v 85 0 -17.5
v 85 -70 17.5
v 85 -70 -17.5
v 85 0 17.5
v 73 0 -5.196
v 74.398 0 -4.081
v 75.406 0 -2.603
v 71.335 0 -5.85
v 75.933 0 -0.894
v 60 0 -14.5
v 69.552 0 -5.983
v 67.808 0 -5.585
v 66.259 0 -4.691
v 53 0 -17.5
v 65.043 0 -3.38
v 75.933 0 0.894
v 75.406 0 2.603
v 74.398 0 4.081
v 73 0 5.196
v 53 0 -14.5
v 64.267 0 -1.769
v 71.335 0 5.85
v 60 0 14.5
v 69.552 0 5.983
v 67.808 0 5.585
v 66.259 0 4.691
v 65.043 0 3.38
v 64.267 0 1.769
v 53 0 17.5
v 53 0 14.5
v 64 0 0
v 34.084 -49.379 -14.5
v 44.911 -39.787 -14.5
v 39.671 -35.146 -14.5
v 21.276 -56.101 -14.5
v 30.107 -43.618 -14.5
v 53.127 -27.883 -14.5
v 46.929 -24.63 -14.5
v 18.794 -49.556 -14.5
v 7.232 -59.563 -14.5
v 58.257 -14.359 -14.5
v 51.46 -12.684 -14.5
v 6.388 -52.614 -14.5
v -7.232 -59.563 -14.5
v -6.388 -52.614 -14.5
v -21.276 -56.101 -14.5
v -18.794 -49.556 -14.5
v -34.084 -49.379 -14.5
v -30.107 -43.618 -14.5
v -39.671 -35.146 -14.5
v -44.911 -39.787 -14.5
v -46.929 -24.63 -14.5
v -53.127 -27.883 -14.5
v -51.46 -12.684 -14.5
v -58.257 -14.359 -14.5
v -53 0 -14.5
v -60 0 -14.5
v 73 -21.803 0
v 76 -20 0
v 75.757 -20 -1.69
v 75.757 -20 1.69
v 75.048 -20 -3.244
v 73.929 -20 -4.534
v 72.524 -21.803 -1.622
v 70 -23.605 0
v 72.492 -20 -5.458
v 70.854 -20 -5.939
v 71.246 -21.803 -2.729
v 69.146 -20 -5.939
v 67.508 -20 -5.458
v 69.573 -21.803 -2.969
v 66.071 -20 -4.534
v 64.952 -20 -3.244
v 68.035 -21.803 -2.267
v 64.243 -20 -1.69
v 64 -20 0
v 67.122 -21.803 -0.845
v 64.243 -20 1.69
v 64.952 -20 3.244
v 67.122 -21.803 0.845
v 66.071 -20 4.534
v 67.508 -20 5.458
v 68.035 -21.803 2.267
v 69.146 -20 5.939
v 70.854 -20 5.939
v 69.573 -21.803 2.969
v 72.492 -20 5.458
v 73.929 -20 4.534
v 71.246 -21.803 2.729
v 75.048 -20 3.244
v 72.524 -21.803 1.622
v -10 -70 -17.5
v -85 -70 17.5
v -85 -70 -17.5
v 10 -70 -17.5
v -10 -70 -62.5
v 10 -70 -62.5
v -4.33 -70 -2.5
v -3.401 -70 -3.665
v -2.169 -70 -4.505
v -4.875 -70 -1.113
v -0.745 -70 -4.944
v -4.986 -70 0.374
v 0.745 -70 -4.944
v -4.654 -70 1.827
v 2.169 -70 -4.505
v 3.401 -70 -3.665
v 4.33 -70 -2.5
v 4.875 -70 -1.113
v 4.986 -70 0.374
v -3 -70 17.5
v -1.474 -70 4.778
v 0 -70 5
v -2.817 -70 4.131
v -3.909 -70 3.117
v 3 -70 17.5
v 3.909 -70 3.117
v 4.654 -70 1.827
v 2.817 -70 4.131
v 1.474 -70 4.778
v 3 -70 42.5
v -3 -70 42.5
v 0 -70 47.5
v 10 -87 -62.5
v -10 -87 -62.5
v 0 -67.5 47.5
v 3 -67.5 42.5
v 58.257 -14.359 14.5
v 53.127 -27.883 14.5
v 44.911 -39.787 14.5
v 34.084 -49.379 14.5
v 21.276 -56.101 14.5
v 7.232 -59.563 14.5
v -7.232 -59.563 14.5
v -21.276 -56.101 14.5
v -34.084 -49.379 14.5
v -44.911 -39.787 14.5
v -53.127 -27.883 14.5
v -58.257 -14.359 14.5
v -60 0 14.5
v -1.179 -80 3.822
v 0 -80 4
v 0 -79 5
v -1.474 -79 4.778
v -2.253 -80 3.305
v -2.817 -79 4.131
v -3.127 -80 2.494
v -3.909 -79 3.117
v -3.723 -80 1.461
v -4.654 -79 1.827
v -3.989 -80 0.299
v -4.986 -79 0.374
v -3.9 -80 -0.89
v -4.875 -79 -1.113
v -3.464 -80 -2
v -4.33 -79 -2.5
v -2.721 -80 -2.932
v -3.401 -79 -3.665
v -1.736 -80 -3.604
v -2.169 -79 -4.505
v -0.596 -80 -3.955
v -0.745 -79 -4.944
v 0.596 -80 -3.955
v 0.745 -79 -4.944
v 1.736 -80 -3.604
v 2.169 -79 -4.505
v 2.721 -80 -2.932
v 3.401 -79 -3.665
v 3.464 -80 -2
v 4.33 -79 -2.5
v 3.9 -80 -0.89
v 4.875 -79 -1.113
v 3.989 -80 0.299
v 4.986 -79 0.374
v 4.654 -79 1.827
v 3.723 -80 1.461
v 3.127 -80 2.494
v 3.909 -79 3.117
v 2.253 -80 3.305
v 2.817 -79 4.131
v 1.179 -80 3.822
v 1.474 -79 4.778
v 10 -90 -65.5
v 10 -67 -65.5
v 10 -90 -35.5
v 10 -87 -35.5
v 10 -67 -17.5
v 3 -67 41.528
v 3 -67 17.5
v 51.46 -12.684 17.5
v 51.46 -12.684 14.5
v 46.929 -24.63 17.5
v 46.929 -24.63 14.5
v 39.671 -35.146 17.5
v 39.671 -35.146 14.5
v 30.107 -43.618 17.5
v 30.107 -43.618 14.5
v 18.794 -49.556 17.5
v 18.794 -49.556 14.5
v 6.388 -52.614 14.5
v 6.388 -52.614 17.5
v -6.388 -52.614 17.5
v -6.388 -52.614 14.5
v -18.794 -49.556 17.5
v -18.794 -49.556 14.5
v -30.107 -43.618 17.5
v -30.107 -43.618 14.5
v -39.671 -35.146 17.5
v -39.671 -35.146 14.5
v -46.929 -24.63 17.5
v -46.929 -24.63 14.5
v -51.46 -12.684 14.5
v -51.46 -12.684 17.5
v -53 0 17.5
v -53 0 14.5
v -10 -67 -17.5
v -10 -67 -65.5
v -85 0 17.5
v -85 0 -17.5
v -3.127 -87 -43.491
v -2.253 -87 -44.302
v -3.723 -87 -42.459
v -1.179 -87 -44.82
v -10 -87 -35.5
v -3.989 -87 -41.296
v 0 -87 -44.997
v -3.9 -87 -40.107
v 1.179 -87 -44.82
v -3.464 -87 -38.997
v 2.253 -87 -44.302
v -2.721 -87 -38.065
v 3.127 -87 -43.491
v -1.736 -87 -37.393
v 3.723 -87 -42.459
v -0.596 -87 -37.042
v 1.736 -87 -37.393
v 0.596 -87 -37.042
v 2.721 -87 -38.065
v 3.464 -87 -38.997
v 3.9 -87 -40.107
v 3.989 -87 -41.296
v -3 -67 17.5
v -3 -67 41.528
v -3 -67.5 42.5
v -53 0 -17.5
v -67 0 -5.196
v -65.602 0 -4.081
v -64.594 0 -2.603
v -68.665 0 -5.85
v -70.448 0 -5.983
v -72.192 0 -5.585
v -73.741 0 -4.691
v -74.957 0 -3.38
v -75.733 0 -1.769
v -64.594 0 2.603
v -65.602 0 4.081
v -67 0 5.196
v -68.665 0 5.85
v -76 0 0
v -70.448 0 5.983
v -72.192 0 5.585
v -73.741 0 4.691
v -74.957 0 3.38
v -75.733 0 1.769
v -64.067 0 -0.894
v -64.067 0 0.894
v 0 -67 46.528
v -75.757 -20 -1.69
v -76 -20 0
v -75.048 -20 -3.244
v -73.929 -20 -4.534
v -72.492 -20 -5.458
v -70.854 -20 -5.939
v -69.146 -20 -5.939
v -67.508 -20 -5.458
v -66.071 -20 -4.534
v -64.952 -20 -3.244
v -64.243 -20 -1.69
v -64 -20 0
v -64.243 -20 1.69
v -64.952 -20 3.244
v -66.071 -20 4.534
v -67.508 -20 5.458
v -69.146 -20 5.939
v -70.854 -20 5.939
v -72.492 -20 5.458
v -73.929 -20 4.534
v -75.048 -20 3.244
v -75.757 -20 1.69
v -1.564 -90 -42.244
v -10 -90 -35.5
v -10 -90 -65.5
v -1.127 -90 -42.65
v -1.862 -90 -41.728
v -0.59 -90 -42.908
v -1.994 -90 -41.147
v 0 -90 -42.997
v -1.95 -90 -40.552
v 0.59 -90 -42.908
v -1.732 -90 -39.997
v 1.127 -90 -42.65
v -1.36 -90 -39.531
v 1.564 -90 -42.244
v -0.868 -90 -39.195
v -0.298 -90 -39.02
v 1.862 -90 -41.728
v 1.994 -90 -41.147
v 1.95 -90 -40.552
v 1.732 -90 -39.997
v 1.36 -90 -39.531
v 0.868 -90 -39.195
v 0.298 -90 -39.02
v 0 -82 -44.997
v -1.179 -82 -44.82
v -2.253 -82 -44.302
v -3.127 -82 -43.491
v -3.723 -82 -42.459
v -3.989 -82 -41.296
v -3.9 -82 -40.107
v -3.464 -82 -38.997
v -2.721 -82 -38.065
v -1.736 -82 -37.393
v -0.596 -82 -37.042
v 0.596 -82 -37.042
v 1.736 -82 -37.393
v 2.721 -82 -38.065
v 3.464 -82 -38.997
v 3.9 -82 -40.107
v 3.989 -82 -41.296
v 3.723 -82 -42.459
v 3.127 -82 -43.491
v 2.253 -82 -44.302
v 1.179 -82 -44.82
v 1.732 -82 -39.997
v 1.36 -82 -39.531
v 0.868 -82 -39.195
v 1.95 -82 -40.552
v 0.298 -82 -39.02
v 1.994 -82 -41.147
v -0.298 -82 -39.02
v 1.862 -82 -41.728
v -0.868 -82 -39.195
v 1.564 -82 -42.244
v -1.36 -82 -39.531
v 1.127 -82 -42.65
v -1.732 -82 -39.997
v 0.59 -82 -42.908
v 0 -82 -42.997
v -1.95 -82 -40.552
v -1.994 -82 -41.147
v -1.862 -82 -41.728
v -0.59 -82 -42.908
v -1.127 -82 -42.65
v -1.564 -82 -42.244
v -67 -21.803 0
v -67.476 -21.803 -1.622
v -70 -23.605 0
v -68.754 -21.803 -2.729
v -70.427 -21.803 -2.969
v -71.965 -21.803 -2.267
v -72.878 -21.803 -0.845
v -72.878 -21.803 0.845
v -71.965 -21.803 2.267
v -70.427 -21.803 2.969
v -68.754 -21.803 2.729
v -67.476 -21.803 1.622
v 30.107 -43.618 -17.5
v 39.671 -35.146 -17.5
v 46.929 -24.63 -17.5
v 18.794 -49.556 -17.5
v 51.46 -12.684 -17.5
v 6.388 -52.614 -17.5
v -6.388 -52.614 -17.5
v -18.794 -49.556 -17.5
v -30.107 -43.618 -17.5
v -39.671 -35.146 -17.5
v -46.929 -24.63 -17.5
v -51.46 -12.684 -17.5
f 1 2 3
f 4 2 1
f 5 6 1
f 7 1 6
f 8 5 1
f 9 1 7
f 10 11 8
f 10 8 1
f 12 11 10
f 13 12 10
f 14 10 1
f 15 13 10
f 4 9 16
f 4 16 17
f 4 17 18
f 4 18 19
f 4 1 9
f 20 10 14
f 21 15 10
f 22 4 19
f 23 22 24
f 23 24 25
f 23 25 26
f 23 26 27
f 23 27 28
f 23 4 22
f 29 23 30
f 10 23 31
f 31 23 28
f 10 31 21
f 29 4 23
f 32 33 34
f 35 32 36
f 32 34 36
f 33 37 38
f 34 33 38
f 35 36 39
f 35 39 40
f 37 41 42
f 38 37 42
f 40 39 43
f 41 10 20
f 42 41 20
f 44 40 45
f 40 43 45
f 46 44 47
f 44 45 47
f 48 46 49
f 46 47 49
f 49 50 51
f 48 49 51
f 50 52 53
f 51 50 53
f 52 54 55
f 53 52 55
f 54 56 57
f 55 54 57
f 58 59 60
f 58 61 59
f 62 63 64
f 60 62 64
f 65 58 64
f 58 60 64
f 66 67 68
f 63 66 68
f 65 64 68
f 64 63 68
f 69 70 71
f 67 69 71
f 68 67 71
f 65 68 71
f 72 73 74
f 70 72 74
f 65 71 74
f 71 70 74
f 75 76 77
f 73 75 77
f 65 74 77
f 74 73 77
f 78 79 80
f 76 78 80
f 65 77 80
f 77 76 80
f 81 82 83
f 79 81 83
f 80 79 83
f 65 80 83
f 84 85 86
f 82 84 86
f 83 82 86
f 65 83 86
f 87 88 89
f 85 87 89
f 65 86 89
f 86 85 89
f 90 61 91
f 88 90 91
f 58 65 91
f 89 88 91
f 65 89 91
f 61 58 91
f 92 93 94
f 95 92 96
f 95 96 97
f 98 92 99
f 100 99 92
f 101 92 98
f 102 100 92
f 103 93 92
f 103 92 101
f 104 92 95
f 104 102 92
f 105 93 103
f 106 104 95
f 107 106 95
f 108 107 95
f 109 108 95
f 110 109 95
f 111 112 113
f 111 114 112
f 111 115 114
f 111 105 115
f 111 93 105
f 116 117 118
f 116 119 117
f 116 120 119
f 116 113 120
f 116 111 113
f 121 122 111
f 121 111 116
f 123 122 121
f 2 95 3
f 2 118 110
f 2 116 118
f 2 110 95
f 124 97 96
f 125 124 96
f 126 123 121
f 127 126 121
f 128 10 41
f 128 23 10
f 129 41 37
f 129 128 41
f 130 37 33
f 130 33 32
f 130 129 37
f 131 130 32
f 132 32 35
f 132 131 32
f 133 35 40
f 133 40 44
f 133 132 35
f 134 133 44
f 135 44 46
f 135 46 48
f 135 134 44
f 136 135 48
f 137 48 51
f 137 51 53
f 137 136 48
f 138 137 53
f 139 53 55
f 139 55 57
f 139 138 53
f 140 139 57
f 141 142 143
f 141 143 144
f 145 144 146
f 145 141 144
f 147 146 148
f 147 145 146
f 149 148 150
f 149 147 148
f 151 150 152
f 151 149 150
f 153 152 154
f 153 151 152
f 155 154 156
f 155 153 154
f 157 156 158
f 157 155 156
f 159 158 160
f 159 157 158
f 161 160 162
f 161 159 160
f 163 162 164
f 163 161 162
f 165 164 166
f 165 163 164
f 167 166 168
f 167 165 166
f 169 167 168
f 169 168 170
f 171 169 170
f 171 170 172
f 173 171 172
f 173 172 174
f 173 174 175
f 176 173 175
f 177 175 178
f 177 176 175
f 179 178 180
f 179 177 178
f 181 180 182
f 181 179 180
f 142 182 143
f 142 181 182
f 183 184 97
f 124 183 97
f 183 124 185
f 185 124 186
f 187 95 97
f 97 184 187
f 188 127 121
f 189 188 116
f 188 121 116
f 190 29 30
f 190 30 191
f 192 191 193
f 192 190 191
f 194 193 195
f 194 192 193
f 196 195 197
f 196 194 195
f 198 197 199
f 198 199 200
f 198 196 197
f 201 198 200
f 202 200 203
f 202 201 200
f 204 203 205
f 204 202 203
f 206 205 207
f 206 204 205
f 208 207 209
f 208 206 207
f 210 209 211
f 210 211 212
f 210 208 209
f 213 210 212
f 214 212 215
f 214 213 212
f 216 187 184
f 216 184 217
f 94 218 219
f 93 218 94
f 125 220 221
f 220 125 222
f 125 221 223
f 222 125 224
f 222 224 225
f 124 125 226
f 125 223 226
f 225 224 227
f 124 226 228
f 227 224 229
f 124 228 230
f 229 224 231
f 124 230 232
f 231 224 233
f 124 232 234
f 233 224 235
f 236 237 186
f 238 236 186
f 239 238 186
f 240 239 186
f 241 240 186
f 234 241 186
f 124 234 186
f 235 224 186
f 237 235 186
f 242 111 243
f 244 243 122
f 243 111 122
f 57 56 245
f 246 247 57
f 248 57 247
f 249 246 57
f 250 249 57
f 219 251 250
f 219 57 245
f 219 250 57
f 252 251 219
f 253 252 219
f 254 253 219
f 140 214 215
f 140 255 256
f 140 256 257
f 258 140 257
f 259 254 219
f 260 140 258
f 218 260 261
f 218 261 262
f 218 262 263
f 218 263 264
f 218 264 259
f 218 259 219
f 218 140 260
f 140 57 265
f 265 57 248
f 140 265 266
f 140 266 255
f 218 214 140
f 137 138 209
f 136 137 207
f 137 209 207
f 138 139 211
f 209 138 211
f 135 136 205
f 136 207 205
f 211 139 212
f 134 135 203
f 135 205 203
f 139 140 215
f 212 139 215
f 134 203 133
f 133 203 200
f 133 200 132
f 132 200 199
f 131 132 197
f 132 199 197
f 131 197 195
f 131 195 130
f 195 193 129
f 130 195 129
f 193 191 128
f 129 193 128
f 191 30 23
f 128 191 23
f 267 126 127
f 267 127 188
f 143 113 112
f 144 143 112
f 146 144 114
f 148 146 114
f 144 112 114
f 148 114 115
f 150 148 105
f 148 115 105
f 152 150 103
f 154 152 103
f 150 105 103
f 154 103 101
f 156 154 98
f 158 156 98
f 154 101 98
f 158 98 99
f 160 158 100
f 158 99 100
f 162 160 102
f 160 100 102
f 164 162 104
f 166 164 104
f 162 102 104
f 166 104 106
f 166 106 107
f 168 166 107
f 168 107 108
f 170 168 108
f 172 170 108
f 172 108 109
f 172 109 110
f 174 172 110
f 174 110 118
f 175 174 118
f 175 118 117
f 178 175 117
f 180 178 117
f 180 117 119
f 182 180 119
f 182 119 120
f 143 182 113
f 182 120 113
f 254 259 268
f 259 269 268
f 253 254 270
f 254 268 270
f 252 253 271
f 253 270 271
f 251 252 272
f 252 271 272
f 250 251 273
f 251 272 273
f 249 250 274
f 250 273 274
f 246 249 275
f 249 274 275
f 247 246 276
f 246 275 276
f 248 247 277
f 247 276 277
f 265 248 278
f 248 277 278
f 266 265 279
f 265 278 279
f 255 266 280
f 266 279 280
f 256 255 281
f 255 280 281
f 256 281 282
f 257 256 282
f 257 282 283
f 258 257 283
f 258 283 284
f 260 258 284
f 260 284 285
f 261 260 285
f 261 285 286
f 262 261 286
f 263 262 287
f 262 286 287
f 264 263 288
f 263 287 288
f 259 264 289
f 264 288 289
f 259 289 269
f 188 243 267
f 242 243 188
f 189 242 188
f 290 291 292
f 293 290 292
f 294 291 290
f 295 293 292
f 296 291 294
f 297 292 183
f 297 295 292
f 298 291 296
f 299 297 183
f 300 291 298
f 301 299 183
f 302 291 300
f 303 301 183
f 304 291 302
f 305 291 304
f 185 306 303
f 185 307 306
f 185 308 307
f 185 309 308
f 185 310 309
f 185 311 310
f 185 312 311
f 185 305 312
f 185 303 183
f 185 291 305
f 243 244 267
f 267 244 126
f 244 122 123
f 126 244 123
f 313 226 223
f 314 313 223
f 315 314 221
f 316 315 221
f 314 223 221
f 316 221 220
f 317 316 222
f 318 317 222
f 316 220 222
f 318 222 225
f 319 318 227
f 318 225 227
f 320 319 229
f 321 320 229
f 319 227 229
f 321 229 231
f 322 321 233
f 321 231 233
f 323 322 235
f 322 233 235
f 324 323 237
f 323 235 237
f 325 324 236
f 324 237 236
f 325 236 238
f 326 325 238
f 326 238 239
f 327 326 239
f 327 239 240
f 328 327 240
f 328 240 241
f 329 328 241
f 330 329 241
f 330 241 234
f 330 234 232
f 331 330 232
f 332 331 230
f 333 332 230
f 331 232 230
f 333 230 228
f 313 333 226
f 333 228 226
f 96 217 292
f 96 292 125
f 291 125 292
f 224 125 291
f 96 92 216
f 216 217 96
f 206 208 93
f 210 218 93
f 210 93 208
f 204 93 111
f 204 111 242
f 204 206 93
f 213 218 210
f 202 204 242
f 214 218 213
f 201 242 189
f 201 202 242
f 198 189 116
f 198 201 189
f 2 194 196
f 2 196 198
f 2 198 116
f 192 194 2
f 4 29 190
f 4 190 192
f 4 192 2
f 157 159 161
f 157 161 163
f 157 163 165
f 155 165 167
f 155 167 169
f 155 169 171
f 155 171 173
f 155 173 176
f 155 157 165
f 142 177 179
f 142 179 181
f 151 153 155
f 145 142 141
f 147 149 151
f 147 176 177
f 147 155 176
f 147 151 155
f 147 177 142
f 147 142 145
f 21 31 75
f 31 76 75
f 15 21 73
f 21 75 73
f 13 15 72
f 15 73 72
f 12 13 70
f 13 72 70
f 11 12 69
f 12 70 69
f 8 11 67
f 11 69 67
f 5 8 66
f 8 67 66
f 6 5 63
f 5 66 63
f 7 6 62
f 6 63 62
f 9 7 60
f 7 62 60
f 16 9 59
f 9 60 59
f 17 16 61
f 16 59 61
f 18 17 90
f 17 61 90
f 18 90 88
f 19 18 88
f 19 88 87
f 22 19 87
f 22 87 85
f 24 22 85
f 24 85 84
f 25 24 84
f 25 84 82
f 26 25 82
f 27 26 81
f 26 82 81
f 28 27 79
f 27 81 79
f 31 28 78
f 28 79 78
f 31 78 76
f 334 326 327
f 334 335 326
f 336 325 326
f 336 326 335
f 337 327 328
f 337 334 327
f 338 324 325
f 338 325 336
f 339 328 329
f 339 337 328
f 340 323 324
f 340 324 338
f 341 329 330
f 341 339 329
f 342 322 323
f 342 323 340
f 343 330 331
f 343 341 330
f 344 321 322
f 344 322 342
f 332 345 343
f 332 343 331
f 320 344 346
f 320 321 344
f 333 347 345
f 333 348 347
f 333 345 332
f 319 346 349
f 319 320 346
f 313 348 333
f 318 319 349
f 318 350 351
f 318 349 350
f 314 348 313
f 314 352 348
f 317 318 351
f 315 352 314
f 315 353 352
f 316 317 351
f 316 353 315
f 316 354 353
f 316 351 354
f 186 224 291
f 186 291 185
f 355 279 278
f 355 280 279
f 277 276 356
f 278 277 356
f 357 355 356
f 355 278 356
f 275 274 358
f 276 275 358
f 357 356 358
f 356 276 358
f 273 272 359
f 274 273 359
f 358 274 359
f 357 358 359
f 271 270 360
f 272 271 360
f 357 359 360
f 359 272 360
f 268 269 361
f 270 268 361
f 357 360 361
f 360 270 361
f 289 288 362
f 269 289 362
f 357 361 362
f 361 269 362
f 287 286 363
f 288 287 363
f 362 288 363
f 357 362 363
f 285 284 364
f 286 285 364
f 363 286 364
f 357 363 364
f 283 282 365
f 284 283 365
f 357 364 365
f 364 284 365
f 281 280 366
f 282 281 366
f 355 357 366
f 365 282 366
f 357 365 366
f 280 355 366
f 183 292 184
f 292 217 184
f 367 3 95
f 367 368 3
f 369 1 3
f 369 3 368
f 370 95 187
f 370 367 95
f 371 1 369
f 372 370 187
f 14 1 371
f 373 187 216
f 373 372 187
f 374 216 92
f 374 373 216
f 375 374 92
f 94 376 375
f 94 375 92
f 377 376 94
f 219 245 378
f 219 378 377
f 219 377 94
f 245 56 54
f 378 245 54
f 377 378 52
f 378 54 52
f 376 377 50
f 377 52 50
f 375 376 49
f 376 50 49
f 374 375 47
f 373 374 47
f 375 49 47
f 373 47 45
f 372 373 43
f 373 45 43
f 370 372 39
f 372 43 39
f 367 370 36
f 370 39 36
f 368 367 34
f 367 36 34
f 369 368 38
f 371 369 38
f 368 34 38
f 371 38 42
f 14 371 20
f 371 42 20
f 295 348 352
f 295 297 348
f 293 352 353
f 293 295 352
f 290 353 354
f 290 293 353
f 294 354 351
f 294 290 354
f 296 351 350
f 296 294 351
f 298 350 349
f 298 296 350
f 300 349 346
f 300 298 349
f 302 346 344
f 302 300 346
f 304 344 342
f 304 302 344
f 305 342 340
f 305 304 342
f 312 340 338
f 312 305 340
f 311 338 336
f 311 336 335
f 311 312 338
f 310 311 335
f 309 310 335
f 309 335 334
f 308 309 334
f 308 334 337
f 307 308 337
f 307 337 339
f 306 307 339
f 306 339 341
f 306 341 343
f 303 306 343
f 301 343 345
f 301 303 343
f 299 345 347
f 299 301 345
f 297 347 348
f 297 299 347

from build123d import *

# Parameters (mm, degrees)
DODANIE_WYCI_GNI_CIE1_DEPTH = 14.5
OTW_R_12_0_12_1_D           = 12
OTW_R_12_0_12_1_DEPTH       = 20
OTW_R_12_0_12_1_TIP         = 3.605163714
DODANIE_WYCI_GNI_CIE2_DEPTH = 3
DODANIE_WYCI_GNI_CIE3_START = 3
DODANIE_WYCI_GNI_CIE3_DEPTH = 3
DODANIE_WYCI_GNI_CIE4_DEPTH = 3
SZKIC7_W                    = 20
SZKIC7_H                    = 20
DODANIE_WYCI_GNI_CIE5_DEPTH = 3
SZKIC8_W                    = 20
SZKIC8_H                    = 30
DODANIE_WYCI_GNI_CIE6_DEPTH = 3
SZKIC9_R                    = 2
WYTNIJ_WYCI_GNI_CIE1_DEPTH  = 8
SZKIC10_R                   = 4
DODANIE_WYCI_GNI_CIE7_DEPTH = 5
WYTNIJ_WYCI_GNI_CIE2_START  = -5
SZKIC13_R                   = 2
WYTNIJ_WYCI_GNI_CIE2_DEPTH  = 5
DODANIE_WYCI_GNI_CIE8_DEPTH = 3
SFAZOWANIE1_SIZE            = 0.5
SZKIC18_R                   = 5
DODANIE_WYCI_GNI_CIE9_DEPTH = 10
SFAZOWANIE2_SIZE            = 1


with BuildPart() as part:
    # Szkic1 → Dodanie-wyciągnięcie1 (new, symmetric)
    with BuildSketch(Plane.XY):
        with BuildLine():
            Line((-60, 0), (-85, 0))
            Line((-85, 0), (-85, -30.5))
            Line((-85, -30.5), (-85, -70))
            Line((-85, -70), (85, -70))
            Line((85, -70), (85, -30.5))
            Line((85, -30.5), (85, 0))
            Line((85, 0), (60, 0))
            ThreePointArc((60, 0), (0, -60), (-60, 0))
        make_face()
    extrude(amount=DODANIE_WYCI_GNI_CIE1_DEPTH, both=True)

    # Otwór Ø12.0 (12)1
    with Locations(Plane(origin=(0, 0, 0), x_dir=(1, 0, 0), z_dir=(0, 1, 0))):
        with Locations((-70, 0), (70, 0)):
            Hole(OTW_R_12_0_12_1_D / 2, depth=OTW_R_12_0_12_1_DEPTH)
            with Locations((0, 0, -(OTW_R_12_0_12_1_DEPTH + OTW_R_12_0_12_1_TIP / 2))):  # 118° drill point
                Cone(0, OTW_R_12_0_12_1_D / 2, OTW_R_12_0_12_1_TIP, mode=Mode.SUBTRACT)

    # Szkic4 → Dodanie-wyciągnięcie2 (add)
    with BuildSketch(Plane(origin=(0, 0, -14.5), x_dir=(-1, 0, 0), z_dir=(0, 0, -1))):
        with BuildLine():
            Line((-53, 0), (-85, 0))
            Line((-85, 0), (-85, -70))
            Line((-85, -70), (85, -70))
            Line((85, -70), (85, 0))
            Line((85, 0), (53, 0))
            ThreePointArc((53, 0), (0, -53), (-53, 0))
        make_face()
    extrude(amount=DODANIE_WYCI_GNI_CIE2_DEPTH)

    # Szkic5 → Dodanie-wyciągnięcie3 (add)
    with BuildSketch(Plane.XY.offset(14.5).offset(DODANIE_WYCI_GNI_CIE3_START)):
        with BuildLine():
            Line((-53, 0), (-85, 0))
            Line((-85, 0), (-85, -70))
            Line((-85, -70), (85, -70))
            Line((85, -70), (85, 0))
            Line((85, 0), (53, 0))
            ThreePointArc((53, 0), (0, -53), (-53, 0))
        make_face()
    extrude(amount=-DODANIE_WYCI_GNI_CIE3_DEPTH)

    # Szkic6 → Dodanie-wyciągnięcie4 (add)
    with BuildSketch(Plane(origin=(0, -70, 0), x_dir=(1, 0, 0), z_dir=(0, 1, 0))):
        Polygon((0, 17.5), (-10, 17.5), (-10, 62.5), (10, 62.5), (10, 17.5), align=None)
    extrude(amount=DODANIE_WYCI_GNI_CIE4_DEPTH)

    # Szkic7 → Dodanie-wyciągnięcie5 (add)
    with BuildSketch(Plane(origin=(0, 0, -62.5), x_dir=(-1, 0, 0), z_dir=(0, 0, -1))):
        with Locations((0, -77)):
            Rectangle(SZKIC7_W, SZKIC7_H)
    extrude(amount=DODANIE_WYCI_GNI_CIE5_DEPTH)

    # Szkic8 → Dodanie-wyciągnięcie6 (add)
    with BuildSketch(Plane.XZ.offset(87)):
        with Locations((0, -50.5)):
            Rectangle(SZKIC8_W, SZKIC8_H)
    extrude(amount=DODANIE_WYCI_GNI_CIE6_DEPTH)

    # Szkic9 → Wytnij-wyciągnięcie1 (cut)
    with BuildSketch(Plane.XZ.offset(90)):
        with Locations(Location((0, -40.997300871, 0), (0, 0, 270))):
            Circle(SZKIC9_R)
    extrude(amount=-WYTNIJ_WYCI_GNI_CIE1_DEPTH, mode=Mode.SUBTRACT)

    # Szkic10 → Dodanie-wyciągnięcie7 (add)
    with BuildSketch(Plane(origin=(0, -87, 0), x_dir=(1, 0, 0), z_dir=(0, 1, 0))):
        with Locations(Location((0, 40.997300871, 0), (0, 0, 90))):
            Circle(SZKIC10_R)
    extrude(amount=DODANIE_WYCI_GNI_CIE7_DEPTH)

    # Szkic13 → Wytnij-wyciągnięcie2 (cut)
    with BuildSketch(Plane(origin=(0, -82, 0), x_dir=(1, 0, 0), z_dir=(0, 1, 0)).offset(WYTNIJ_WYCI_GNI_CIE2_START)):
        with Locations(Location((0, 40.997300871, 0), (0, 0, 90))):
            Circle(SZKIC13_R)
    extrude(amount=WYTNIJ_WYCI_GNI_CIE2_DEPTH, mode=Mode.SUBTRACT)

    # Szkic14 → Dodanie-wyciągnięcie8 (add)
    with BuildSketch(Plane(origin=(0, -70, 0), x_dir=(1, 0, 0), z_dir=(0, 1, 0))):
        Polygon((3, -17.5), (-3, -17.5), (-3, -42.5), (0, -47.5), (3, -42.5), align=None)
    extrude(amount=DODANIE_WYCI_GNI_CIE8_DEPTH)

    # Sfazowanie1
    sfazowanie1_edges = [part.edges().sort_by_distance(p)[0] for p in [
        (1.5, -67, 45),
        (-1.5, -67, 45),
    ]]
    chamfer(sfazowanie1_edges, length=SFAZOWANIE1_SIZE)

    # Szkic18 → Dodanie-wyciągnięcie9 (add)
    with BuildSketch(Plane(origin=(0, -70, 0), x_dir=(-1, 0, 0), z_dir=(0, -1, 0))):
        with Locations(Location((0, 0, 0), (0, 0, 270))):
            Circle(SZKIC18_R)
    extrude(amount=DODANIE_WYCI_GNI_CIE9_DEPTH)

    # Sfazowanie2
    sfazowanie2_edges = [part.edges().sort_by_distance(p)[0] for p in [
        (0, -80, -5),
    ]]
    chamfer(sfazowanie2_edges, length=SFAZOWANIE2_SIZE)


solid = part.part
